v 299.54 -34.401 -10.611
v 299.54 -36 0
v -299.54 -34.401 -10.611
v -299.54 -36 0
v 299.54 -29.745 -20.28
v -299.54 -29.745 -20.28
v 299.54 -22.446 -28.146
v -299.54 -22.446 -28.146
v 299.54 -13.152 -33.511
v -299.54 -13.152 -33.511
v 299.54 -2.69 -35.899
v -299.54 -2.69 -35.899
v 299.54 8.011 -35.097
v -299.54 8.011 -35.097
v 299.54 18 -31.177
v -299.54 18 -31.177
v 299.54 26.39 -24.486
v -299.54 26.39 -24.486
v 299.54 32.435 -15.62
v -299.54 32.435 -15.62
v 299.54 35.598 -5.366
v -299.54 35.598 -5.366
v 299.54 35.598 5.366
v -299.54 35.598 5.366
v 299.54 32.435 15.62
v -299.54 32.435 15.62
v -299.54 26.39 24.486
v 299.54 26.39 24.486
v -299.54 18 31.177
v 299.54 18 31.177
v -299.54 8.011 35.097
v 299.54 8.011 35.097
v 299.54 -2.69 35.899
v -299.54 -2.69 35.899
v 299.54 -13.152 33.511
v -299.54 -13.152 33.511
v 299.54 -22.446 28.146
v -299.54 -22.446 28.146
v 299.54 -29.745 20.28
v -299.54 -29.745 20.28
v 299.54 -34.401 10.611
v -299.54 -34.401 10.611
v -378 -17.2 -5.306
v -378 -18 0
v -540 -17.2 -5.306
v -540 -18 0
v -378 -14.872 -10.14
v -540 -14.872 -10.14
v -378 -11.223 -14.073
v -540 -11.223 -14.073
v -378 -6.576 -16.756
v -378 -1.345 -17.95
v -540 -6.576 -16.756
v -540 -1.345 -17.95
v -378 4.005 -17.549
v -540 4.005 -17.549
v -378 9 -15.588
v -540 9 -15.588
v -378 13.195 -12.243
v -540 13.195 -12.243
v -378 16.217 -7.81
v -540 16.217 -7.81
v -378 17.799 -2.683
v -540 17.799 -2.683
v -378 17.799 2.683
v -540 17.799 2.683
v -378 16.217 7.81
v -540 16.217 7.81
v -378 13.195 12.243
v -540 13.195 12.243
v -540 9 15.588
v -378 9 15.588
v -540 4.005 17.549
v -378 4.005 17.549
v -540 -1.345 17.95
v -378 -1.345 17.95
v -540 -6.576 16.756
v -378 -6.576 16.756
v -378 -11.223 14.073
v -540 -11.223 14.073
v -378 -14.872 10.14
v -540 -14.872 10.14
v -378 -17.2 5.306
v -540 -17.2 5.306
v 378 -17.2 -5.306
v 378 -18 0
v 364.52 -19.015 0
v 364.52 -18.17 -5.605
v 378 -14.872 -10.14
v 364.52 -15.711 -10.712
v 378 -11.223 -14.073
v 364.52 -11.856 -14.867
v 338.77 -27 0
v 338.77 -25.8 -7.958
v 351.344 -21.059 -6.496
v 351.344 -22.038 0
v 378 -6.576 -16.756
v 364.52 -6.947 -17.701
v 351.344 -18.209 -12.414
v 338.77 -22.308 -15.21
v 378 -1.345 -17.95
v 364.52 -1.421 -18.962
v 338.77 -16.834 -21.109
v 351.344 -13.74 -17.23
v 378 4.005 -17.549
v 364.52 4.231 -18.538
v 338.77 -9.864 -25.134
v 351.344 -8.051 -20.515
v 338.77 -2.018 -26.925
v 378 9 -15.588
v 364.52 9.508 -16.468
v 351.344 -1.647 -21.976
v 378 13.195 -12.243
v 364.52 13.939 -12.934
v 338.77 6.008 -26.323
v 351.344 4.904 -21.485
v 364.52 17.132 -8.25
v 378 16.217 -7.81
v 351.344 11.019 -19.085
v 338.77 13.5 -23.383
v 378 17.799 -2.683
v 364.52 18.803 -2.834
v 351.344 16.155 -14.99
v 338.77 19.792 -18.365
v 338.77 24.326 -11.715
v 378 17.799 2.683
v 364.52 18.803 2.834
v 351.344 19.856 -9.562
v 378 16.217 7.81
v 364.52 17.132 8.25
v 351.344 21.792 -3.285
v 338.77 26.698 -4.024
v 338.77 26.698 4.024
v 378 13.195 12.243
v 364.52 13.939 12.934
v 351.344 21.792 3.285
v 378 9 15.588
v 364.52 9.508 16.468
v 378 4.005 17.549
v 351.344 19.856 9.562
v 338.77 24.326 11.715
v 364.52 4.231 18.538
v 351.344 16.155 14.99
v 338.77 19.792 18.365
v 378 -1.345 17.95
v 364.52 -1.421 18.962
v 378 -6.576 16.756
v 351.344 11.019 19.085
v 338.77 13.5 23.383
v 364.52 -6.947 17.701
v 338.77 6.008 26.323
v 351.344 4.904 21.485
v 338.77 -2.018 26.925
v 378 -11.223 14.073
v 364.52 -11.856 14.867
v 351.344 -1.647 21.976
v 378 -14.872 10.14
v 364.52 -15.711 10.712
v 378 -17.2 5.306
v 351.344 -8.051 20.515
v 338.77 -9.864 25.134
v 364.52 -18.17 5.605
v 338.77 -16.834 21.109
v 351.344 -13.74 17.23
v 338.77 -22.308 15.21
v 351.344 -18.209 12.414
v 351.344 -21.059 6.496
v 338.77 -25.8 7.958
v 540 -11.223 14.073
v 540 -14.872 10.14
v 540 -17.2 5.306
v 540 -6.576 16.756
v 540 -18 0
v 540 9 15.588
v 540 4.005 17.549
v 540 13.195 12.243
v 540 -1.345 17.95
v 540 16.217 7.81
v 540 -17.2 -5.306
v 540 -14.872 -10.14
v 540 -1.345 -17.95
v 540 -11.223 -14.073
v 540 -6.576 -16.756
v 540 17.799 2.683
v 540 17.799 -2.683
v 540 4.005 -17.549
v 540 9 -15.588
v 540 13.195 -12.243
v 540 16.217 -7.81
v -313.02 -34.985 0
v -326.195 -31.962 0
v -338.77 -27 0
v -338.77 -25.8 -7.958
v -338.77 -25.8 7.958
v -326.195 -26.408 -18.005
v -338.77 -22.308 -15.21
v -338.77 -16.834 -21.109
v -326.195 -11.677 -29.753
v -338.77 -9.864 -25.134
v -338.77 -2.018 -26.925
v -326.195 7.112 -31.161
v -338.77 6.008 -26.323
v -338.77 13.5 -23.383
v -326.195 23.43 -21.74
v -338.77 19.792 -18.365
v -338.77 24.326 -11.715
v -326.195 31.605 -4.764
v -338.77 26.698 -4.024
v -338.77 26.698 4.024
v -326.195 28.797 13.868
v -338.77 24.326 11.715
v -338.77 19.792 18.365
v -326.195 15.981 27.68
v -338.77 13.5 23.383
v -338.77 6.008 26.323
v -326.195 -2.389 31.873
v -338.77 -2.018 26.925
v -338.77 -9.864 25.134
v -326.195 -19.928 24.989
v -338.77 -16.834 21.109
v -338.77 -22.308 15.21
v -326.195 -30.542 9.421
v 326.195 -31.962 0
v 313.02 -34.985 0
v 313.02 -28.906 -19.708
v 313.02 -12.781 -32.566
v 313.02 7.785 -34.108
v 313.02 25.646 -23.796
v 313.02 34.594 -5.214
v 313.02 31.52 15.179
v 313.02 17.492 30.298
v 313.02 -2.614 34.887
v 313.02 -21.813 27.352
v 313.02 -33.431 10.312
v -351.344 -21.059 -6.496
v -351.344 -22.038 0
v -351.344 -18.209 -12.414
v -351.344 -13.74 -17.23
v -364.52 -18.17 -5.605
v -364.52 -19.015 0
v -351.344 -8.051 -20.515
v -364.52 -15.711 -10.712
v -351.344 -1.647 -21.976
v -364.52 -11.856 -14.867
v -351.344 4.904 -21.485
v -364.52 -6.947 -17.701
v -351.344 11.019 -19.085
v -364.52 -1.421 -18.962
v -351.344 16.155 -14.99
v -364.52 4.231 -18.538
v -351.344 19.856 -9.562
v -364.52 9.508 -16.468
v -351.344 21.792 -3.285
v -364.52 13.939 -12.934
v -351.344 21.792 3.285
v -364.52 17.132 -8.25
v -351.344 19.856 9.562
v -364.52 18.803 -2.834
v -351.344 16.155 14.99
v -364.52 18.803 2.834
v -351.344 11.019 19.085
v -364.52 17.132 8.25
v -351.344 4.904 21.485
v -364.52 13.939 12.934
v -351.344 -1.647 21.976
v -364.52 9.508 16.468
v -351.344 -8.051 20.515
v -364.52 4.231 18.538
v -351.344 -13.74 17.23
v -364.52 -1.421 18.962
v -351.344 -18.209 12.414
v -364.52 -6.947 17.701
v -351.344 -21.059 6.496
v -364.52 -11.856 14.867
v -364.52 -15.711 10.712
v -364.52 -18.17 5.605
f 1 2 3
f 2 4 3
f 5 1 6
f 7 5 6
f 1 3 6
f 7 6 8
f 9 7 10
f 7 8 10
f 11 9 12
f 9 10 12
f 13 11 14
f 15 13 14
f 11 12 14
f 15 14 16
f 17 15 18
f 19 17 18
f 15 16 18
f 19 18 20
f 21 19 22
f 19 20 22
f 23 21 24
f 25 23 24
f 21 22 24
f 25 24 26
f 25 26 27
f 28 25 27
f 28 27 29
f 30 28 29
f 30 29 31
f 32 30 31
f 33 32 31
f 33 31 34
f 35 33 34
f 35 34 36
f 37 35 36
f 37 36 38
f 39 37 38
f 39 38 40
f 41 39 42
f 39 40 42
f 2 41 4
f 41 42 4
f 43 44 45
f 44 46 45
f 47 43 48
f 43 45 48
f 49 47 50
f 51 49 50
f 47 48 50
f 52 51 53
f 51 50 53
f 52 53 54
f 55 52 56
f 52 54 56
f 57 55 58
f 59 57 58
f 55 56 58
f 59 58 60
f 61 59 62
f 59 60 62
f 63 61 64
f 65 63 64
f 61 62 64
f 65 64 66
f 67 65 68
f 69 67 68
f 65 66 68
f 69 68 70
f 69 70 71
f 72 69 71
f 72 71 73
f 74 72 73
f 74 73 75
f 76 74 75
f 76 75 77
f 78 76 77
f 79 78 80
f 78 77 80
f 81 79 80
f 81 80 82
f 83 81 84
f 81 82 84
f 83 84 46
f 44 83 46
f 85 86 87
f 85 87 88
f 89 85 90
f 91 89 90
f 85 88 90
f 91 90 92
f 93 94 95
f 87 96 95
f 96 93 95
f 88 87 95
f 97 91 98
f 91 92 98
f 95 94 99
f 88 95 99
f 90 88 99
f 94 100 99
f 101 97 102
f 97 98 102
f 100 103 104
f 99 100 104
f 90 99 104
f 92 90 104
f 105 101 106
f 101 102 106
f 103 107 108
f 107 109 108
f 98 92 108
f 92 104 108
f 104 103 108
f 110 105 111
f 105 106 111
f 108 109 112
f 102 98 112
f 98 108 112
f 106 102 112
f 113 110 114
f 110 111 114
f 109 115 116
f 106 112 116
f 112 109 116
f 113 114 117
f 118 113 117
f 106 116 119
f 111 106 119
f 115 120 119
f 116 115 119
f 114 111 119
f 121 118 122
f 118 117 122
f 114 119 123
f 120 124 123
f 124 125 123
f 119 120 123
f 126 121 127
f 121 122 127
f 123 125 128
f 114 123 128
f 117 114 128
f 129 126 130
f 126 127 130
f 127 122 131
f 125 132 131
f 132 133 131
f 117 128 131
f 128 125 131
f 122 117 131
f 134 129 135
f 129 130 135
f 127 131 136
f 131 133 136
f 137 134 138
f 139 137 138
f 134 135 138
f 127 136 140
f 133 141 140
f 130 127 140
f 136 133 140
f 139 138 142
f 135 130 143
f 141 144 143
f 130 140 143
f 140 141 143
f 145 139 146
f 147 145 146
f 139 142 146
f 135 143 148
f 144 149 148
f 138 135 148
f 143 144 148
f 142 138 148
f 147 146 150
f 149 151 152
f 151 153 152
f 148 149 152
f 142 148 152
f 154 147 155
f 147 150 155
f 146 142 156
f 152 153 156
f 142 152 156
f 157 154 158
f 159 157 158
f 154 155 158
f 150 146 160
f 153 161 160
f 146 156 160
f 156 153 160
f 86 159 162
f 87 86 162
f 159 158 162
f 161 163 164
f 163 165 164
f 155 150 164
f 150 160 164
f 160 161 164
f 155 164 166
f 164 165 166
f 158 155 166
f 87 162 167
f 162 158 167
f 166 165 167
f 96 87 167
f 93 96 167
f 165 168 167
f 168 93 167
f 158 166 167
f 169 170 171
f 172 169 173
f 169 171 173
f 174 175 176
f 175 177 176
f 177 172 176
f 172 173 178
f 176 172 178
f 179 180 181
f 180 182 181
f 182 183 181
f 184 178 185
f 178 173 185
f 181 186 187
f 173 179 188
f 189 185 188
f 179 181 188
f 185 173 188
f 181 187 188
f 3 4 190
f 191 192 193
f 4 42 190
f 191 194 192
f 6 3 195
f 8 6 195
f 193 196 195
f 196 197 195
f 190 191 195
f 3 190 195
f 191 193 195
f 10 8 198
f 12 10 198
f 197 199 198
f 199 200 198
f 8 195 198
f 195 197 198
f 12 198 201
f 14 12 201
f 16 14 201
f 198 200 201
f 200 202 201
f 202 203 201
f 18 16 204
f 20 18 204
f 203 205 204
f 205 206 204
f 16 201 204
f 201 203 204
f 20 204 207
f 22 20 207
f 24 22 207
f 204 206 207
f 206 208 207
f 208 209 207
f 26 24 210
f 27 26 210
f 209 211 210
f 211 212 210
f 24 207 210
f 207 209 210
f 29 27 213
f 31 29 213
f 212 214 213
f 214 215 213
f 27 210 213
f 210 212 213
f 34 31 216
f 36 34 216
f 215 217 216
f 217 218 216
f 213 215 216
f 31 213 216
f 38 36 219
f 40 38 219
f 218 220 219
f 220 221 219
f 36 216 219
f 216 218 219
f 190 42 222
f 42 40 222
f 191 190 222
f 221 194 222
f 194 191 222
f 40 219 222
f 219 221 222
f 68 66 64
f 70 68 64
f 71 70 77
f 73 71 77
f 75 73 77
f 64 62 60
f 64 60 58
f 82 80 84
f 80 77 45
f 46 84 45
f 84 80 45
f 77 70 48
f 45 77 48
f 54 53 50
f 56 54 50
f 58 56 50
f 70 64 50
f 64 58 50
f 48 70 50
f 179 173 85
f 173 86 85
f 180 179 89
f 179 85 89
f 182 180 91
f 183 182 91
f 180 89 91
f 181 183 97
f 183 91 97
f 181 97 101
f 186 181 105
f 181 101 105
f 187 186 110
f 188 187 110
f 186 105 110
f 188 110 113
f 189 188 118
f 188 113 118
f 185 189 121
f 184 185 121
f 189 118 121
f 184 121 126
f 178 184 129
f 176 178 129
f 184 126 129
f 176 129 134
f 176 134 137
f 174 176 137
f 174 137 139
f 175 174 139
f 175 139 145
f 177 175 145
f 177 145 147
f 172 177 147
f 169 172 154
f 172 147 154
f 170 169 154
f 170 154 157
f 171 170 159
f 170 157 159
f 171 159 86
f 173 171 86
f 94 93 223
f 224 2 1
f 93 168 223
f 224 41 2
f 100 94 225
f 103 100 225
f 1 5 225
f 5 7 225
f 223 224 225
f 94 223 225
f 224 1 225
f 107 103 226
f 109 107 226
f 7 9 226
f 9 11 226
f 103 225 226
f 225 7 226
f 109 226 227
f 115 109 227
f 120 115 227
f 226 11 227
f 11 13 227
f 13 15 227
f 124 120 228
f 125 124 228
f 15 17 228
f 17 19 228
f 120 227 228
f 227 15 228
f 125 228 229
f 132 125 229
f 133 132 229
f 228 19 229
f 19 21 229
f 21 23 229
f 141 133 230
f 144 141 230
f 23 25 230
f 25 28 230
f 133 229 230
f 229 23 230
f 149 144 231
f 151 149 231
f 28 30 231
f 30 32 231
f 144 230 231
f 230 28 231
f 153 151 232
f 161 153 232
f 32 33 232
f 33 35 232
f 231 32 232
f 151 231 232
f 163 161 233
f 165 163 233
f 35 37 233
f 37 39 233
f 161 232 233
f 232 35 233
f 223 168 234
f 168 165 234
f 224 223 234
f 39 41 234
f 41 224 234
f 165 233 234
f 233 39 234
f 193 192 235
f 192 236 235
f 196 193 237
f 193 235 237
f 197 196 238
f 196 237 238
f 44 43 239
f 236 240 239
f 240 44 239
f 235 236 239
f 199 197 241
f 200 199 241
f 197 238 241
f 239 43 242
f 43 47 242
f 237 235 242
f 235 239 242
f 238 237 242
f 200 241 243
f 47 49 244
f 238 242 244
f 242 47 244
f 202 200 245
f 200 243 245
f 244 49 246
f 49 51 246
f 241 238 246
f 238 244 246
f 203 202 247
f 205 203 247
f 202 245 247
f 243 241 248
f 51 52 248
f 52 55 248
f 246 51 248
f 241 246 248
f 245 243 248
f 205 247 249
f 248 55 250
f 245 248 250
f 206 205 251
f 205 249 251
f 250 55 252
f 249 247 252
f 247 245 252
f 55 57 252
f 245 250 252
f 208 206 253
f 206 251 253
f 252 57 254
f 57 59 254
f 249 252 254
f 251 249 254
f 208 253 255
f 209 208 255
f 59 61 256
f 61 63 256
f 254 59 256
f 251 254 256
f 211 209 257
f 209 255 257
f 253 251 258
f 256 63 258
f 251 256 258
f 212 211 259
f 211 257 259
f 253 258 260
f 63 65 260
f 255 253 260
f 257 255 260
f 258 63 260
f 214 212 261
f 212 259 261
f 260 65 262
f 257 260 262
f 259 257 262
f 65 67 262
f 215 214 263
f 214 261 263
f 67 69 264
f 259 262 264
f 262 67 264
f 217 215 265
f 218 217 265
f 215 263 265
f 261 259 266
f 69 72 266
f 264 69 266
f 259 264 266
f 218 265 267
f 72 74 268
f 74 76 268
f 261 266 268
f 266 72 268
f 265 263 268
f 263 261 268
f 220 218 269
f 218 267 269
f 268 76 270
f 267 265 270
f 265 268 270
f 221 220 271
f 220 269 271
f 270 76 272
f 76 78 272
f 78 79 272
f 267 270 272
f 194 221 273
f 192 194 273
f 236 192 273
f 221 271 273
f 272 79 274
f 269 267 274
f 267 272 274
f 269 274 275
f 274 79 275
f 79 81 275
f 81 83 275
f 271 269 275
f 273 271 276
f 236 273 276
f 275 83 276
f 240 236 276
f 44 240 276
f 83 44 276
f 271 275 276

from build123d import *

# Parameters (mm, degrees)
SCALE1_SCALE = 18


with BuildPart() as part:
    # Sketch1 → Revolve1 (revolve)
    with BuildSketch(Plane.XY, mode=Mode.PRIVATE) as revolve1_sk:
        with BuildLine():
            Line((-30, 0), (30, 0))
            Line((30, 0), (30, 1))
            Line((30, 1), (21, 1))
            ThreePointArc((21, 1), (19.881966011, 1.126602828), (18.820550528, 1.5))
            ThreePointArc((18.820550528, 1.5), (17.759135045, 1.873397172), (16.641101056, 2))
            Line((16.641101056, 2), (-16.641101056, 2))
            ThreePointArc((-16.641101056, 2), (-17.759135045, 1.873397172), (-18.820550528, 1.5))
            ThreePointArc((-18.820550528, 1.5), (-19.881966011, 1.126602828), (-21, 1))
            Line((-21, 1), (-30, 1))
            Line((-30, 1), (-30, 0))
        make_face()
    revolve(revolve1_sk.sketch.rotate(Axis((-30, 0, 0), (1, 0, 0)), 180), axis=Axis((-30, 0, 0), (1, 0, 0)))


with BuildPart() as part_1:
    # Scale1: scaled about (0, 0, 0)
    add(part.part.scale(SCALE1_SCALE))


solid = part_1.part
